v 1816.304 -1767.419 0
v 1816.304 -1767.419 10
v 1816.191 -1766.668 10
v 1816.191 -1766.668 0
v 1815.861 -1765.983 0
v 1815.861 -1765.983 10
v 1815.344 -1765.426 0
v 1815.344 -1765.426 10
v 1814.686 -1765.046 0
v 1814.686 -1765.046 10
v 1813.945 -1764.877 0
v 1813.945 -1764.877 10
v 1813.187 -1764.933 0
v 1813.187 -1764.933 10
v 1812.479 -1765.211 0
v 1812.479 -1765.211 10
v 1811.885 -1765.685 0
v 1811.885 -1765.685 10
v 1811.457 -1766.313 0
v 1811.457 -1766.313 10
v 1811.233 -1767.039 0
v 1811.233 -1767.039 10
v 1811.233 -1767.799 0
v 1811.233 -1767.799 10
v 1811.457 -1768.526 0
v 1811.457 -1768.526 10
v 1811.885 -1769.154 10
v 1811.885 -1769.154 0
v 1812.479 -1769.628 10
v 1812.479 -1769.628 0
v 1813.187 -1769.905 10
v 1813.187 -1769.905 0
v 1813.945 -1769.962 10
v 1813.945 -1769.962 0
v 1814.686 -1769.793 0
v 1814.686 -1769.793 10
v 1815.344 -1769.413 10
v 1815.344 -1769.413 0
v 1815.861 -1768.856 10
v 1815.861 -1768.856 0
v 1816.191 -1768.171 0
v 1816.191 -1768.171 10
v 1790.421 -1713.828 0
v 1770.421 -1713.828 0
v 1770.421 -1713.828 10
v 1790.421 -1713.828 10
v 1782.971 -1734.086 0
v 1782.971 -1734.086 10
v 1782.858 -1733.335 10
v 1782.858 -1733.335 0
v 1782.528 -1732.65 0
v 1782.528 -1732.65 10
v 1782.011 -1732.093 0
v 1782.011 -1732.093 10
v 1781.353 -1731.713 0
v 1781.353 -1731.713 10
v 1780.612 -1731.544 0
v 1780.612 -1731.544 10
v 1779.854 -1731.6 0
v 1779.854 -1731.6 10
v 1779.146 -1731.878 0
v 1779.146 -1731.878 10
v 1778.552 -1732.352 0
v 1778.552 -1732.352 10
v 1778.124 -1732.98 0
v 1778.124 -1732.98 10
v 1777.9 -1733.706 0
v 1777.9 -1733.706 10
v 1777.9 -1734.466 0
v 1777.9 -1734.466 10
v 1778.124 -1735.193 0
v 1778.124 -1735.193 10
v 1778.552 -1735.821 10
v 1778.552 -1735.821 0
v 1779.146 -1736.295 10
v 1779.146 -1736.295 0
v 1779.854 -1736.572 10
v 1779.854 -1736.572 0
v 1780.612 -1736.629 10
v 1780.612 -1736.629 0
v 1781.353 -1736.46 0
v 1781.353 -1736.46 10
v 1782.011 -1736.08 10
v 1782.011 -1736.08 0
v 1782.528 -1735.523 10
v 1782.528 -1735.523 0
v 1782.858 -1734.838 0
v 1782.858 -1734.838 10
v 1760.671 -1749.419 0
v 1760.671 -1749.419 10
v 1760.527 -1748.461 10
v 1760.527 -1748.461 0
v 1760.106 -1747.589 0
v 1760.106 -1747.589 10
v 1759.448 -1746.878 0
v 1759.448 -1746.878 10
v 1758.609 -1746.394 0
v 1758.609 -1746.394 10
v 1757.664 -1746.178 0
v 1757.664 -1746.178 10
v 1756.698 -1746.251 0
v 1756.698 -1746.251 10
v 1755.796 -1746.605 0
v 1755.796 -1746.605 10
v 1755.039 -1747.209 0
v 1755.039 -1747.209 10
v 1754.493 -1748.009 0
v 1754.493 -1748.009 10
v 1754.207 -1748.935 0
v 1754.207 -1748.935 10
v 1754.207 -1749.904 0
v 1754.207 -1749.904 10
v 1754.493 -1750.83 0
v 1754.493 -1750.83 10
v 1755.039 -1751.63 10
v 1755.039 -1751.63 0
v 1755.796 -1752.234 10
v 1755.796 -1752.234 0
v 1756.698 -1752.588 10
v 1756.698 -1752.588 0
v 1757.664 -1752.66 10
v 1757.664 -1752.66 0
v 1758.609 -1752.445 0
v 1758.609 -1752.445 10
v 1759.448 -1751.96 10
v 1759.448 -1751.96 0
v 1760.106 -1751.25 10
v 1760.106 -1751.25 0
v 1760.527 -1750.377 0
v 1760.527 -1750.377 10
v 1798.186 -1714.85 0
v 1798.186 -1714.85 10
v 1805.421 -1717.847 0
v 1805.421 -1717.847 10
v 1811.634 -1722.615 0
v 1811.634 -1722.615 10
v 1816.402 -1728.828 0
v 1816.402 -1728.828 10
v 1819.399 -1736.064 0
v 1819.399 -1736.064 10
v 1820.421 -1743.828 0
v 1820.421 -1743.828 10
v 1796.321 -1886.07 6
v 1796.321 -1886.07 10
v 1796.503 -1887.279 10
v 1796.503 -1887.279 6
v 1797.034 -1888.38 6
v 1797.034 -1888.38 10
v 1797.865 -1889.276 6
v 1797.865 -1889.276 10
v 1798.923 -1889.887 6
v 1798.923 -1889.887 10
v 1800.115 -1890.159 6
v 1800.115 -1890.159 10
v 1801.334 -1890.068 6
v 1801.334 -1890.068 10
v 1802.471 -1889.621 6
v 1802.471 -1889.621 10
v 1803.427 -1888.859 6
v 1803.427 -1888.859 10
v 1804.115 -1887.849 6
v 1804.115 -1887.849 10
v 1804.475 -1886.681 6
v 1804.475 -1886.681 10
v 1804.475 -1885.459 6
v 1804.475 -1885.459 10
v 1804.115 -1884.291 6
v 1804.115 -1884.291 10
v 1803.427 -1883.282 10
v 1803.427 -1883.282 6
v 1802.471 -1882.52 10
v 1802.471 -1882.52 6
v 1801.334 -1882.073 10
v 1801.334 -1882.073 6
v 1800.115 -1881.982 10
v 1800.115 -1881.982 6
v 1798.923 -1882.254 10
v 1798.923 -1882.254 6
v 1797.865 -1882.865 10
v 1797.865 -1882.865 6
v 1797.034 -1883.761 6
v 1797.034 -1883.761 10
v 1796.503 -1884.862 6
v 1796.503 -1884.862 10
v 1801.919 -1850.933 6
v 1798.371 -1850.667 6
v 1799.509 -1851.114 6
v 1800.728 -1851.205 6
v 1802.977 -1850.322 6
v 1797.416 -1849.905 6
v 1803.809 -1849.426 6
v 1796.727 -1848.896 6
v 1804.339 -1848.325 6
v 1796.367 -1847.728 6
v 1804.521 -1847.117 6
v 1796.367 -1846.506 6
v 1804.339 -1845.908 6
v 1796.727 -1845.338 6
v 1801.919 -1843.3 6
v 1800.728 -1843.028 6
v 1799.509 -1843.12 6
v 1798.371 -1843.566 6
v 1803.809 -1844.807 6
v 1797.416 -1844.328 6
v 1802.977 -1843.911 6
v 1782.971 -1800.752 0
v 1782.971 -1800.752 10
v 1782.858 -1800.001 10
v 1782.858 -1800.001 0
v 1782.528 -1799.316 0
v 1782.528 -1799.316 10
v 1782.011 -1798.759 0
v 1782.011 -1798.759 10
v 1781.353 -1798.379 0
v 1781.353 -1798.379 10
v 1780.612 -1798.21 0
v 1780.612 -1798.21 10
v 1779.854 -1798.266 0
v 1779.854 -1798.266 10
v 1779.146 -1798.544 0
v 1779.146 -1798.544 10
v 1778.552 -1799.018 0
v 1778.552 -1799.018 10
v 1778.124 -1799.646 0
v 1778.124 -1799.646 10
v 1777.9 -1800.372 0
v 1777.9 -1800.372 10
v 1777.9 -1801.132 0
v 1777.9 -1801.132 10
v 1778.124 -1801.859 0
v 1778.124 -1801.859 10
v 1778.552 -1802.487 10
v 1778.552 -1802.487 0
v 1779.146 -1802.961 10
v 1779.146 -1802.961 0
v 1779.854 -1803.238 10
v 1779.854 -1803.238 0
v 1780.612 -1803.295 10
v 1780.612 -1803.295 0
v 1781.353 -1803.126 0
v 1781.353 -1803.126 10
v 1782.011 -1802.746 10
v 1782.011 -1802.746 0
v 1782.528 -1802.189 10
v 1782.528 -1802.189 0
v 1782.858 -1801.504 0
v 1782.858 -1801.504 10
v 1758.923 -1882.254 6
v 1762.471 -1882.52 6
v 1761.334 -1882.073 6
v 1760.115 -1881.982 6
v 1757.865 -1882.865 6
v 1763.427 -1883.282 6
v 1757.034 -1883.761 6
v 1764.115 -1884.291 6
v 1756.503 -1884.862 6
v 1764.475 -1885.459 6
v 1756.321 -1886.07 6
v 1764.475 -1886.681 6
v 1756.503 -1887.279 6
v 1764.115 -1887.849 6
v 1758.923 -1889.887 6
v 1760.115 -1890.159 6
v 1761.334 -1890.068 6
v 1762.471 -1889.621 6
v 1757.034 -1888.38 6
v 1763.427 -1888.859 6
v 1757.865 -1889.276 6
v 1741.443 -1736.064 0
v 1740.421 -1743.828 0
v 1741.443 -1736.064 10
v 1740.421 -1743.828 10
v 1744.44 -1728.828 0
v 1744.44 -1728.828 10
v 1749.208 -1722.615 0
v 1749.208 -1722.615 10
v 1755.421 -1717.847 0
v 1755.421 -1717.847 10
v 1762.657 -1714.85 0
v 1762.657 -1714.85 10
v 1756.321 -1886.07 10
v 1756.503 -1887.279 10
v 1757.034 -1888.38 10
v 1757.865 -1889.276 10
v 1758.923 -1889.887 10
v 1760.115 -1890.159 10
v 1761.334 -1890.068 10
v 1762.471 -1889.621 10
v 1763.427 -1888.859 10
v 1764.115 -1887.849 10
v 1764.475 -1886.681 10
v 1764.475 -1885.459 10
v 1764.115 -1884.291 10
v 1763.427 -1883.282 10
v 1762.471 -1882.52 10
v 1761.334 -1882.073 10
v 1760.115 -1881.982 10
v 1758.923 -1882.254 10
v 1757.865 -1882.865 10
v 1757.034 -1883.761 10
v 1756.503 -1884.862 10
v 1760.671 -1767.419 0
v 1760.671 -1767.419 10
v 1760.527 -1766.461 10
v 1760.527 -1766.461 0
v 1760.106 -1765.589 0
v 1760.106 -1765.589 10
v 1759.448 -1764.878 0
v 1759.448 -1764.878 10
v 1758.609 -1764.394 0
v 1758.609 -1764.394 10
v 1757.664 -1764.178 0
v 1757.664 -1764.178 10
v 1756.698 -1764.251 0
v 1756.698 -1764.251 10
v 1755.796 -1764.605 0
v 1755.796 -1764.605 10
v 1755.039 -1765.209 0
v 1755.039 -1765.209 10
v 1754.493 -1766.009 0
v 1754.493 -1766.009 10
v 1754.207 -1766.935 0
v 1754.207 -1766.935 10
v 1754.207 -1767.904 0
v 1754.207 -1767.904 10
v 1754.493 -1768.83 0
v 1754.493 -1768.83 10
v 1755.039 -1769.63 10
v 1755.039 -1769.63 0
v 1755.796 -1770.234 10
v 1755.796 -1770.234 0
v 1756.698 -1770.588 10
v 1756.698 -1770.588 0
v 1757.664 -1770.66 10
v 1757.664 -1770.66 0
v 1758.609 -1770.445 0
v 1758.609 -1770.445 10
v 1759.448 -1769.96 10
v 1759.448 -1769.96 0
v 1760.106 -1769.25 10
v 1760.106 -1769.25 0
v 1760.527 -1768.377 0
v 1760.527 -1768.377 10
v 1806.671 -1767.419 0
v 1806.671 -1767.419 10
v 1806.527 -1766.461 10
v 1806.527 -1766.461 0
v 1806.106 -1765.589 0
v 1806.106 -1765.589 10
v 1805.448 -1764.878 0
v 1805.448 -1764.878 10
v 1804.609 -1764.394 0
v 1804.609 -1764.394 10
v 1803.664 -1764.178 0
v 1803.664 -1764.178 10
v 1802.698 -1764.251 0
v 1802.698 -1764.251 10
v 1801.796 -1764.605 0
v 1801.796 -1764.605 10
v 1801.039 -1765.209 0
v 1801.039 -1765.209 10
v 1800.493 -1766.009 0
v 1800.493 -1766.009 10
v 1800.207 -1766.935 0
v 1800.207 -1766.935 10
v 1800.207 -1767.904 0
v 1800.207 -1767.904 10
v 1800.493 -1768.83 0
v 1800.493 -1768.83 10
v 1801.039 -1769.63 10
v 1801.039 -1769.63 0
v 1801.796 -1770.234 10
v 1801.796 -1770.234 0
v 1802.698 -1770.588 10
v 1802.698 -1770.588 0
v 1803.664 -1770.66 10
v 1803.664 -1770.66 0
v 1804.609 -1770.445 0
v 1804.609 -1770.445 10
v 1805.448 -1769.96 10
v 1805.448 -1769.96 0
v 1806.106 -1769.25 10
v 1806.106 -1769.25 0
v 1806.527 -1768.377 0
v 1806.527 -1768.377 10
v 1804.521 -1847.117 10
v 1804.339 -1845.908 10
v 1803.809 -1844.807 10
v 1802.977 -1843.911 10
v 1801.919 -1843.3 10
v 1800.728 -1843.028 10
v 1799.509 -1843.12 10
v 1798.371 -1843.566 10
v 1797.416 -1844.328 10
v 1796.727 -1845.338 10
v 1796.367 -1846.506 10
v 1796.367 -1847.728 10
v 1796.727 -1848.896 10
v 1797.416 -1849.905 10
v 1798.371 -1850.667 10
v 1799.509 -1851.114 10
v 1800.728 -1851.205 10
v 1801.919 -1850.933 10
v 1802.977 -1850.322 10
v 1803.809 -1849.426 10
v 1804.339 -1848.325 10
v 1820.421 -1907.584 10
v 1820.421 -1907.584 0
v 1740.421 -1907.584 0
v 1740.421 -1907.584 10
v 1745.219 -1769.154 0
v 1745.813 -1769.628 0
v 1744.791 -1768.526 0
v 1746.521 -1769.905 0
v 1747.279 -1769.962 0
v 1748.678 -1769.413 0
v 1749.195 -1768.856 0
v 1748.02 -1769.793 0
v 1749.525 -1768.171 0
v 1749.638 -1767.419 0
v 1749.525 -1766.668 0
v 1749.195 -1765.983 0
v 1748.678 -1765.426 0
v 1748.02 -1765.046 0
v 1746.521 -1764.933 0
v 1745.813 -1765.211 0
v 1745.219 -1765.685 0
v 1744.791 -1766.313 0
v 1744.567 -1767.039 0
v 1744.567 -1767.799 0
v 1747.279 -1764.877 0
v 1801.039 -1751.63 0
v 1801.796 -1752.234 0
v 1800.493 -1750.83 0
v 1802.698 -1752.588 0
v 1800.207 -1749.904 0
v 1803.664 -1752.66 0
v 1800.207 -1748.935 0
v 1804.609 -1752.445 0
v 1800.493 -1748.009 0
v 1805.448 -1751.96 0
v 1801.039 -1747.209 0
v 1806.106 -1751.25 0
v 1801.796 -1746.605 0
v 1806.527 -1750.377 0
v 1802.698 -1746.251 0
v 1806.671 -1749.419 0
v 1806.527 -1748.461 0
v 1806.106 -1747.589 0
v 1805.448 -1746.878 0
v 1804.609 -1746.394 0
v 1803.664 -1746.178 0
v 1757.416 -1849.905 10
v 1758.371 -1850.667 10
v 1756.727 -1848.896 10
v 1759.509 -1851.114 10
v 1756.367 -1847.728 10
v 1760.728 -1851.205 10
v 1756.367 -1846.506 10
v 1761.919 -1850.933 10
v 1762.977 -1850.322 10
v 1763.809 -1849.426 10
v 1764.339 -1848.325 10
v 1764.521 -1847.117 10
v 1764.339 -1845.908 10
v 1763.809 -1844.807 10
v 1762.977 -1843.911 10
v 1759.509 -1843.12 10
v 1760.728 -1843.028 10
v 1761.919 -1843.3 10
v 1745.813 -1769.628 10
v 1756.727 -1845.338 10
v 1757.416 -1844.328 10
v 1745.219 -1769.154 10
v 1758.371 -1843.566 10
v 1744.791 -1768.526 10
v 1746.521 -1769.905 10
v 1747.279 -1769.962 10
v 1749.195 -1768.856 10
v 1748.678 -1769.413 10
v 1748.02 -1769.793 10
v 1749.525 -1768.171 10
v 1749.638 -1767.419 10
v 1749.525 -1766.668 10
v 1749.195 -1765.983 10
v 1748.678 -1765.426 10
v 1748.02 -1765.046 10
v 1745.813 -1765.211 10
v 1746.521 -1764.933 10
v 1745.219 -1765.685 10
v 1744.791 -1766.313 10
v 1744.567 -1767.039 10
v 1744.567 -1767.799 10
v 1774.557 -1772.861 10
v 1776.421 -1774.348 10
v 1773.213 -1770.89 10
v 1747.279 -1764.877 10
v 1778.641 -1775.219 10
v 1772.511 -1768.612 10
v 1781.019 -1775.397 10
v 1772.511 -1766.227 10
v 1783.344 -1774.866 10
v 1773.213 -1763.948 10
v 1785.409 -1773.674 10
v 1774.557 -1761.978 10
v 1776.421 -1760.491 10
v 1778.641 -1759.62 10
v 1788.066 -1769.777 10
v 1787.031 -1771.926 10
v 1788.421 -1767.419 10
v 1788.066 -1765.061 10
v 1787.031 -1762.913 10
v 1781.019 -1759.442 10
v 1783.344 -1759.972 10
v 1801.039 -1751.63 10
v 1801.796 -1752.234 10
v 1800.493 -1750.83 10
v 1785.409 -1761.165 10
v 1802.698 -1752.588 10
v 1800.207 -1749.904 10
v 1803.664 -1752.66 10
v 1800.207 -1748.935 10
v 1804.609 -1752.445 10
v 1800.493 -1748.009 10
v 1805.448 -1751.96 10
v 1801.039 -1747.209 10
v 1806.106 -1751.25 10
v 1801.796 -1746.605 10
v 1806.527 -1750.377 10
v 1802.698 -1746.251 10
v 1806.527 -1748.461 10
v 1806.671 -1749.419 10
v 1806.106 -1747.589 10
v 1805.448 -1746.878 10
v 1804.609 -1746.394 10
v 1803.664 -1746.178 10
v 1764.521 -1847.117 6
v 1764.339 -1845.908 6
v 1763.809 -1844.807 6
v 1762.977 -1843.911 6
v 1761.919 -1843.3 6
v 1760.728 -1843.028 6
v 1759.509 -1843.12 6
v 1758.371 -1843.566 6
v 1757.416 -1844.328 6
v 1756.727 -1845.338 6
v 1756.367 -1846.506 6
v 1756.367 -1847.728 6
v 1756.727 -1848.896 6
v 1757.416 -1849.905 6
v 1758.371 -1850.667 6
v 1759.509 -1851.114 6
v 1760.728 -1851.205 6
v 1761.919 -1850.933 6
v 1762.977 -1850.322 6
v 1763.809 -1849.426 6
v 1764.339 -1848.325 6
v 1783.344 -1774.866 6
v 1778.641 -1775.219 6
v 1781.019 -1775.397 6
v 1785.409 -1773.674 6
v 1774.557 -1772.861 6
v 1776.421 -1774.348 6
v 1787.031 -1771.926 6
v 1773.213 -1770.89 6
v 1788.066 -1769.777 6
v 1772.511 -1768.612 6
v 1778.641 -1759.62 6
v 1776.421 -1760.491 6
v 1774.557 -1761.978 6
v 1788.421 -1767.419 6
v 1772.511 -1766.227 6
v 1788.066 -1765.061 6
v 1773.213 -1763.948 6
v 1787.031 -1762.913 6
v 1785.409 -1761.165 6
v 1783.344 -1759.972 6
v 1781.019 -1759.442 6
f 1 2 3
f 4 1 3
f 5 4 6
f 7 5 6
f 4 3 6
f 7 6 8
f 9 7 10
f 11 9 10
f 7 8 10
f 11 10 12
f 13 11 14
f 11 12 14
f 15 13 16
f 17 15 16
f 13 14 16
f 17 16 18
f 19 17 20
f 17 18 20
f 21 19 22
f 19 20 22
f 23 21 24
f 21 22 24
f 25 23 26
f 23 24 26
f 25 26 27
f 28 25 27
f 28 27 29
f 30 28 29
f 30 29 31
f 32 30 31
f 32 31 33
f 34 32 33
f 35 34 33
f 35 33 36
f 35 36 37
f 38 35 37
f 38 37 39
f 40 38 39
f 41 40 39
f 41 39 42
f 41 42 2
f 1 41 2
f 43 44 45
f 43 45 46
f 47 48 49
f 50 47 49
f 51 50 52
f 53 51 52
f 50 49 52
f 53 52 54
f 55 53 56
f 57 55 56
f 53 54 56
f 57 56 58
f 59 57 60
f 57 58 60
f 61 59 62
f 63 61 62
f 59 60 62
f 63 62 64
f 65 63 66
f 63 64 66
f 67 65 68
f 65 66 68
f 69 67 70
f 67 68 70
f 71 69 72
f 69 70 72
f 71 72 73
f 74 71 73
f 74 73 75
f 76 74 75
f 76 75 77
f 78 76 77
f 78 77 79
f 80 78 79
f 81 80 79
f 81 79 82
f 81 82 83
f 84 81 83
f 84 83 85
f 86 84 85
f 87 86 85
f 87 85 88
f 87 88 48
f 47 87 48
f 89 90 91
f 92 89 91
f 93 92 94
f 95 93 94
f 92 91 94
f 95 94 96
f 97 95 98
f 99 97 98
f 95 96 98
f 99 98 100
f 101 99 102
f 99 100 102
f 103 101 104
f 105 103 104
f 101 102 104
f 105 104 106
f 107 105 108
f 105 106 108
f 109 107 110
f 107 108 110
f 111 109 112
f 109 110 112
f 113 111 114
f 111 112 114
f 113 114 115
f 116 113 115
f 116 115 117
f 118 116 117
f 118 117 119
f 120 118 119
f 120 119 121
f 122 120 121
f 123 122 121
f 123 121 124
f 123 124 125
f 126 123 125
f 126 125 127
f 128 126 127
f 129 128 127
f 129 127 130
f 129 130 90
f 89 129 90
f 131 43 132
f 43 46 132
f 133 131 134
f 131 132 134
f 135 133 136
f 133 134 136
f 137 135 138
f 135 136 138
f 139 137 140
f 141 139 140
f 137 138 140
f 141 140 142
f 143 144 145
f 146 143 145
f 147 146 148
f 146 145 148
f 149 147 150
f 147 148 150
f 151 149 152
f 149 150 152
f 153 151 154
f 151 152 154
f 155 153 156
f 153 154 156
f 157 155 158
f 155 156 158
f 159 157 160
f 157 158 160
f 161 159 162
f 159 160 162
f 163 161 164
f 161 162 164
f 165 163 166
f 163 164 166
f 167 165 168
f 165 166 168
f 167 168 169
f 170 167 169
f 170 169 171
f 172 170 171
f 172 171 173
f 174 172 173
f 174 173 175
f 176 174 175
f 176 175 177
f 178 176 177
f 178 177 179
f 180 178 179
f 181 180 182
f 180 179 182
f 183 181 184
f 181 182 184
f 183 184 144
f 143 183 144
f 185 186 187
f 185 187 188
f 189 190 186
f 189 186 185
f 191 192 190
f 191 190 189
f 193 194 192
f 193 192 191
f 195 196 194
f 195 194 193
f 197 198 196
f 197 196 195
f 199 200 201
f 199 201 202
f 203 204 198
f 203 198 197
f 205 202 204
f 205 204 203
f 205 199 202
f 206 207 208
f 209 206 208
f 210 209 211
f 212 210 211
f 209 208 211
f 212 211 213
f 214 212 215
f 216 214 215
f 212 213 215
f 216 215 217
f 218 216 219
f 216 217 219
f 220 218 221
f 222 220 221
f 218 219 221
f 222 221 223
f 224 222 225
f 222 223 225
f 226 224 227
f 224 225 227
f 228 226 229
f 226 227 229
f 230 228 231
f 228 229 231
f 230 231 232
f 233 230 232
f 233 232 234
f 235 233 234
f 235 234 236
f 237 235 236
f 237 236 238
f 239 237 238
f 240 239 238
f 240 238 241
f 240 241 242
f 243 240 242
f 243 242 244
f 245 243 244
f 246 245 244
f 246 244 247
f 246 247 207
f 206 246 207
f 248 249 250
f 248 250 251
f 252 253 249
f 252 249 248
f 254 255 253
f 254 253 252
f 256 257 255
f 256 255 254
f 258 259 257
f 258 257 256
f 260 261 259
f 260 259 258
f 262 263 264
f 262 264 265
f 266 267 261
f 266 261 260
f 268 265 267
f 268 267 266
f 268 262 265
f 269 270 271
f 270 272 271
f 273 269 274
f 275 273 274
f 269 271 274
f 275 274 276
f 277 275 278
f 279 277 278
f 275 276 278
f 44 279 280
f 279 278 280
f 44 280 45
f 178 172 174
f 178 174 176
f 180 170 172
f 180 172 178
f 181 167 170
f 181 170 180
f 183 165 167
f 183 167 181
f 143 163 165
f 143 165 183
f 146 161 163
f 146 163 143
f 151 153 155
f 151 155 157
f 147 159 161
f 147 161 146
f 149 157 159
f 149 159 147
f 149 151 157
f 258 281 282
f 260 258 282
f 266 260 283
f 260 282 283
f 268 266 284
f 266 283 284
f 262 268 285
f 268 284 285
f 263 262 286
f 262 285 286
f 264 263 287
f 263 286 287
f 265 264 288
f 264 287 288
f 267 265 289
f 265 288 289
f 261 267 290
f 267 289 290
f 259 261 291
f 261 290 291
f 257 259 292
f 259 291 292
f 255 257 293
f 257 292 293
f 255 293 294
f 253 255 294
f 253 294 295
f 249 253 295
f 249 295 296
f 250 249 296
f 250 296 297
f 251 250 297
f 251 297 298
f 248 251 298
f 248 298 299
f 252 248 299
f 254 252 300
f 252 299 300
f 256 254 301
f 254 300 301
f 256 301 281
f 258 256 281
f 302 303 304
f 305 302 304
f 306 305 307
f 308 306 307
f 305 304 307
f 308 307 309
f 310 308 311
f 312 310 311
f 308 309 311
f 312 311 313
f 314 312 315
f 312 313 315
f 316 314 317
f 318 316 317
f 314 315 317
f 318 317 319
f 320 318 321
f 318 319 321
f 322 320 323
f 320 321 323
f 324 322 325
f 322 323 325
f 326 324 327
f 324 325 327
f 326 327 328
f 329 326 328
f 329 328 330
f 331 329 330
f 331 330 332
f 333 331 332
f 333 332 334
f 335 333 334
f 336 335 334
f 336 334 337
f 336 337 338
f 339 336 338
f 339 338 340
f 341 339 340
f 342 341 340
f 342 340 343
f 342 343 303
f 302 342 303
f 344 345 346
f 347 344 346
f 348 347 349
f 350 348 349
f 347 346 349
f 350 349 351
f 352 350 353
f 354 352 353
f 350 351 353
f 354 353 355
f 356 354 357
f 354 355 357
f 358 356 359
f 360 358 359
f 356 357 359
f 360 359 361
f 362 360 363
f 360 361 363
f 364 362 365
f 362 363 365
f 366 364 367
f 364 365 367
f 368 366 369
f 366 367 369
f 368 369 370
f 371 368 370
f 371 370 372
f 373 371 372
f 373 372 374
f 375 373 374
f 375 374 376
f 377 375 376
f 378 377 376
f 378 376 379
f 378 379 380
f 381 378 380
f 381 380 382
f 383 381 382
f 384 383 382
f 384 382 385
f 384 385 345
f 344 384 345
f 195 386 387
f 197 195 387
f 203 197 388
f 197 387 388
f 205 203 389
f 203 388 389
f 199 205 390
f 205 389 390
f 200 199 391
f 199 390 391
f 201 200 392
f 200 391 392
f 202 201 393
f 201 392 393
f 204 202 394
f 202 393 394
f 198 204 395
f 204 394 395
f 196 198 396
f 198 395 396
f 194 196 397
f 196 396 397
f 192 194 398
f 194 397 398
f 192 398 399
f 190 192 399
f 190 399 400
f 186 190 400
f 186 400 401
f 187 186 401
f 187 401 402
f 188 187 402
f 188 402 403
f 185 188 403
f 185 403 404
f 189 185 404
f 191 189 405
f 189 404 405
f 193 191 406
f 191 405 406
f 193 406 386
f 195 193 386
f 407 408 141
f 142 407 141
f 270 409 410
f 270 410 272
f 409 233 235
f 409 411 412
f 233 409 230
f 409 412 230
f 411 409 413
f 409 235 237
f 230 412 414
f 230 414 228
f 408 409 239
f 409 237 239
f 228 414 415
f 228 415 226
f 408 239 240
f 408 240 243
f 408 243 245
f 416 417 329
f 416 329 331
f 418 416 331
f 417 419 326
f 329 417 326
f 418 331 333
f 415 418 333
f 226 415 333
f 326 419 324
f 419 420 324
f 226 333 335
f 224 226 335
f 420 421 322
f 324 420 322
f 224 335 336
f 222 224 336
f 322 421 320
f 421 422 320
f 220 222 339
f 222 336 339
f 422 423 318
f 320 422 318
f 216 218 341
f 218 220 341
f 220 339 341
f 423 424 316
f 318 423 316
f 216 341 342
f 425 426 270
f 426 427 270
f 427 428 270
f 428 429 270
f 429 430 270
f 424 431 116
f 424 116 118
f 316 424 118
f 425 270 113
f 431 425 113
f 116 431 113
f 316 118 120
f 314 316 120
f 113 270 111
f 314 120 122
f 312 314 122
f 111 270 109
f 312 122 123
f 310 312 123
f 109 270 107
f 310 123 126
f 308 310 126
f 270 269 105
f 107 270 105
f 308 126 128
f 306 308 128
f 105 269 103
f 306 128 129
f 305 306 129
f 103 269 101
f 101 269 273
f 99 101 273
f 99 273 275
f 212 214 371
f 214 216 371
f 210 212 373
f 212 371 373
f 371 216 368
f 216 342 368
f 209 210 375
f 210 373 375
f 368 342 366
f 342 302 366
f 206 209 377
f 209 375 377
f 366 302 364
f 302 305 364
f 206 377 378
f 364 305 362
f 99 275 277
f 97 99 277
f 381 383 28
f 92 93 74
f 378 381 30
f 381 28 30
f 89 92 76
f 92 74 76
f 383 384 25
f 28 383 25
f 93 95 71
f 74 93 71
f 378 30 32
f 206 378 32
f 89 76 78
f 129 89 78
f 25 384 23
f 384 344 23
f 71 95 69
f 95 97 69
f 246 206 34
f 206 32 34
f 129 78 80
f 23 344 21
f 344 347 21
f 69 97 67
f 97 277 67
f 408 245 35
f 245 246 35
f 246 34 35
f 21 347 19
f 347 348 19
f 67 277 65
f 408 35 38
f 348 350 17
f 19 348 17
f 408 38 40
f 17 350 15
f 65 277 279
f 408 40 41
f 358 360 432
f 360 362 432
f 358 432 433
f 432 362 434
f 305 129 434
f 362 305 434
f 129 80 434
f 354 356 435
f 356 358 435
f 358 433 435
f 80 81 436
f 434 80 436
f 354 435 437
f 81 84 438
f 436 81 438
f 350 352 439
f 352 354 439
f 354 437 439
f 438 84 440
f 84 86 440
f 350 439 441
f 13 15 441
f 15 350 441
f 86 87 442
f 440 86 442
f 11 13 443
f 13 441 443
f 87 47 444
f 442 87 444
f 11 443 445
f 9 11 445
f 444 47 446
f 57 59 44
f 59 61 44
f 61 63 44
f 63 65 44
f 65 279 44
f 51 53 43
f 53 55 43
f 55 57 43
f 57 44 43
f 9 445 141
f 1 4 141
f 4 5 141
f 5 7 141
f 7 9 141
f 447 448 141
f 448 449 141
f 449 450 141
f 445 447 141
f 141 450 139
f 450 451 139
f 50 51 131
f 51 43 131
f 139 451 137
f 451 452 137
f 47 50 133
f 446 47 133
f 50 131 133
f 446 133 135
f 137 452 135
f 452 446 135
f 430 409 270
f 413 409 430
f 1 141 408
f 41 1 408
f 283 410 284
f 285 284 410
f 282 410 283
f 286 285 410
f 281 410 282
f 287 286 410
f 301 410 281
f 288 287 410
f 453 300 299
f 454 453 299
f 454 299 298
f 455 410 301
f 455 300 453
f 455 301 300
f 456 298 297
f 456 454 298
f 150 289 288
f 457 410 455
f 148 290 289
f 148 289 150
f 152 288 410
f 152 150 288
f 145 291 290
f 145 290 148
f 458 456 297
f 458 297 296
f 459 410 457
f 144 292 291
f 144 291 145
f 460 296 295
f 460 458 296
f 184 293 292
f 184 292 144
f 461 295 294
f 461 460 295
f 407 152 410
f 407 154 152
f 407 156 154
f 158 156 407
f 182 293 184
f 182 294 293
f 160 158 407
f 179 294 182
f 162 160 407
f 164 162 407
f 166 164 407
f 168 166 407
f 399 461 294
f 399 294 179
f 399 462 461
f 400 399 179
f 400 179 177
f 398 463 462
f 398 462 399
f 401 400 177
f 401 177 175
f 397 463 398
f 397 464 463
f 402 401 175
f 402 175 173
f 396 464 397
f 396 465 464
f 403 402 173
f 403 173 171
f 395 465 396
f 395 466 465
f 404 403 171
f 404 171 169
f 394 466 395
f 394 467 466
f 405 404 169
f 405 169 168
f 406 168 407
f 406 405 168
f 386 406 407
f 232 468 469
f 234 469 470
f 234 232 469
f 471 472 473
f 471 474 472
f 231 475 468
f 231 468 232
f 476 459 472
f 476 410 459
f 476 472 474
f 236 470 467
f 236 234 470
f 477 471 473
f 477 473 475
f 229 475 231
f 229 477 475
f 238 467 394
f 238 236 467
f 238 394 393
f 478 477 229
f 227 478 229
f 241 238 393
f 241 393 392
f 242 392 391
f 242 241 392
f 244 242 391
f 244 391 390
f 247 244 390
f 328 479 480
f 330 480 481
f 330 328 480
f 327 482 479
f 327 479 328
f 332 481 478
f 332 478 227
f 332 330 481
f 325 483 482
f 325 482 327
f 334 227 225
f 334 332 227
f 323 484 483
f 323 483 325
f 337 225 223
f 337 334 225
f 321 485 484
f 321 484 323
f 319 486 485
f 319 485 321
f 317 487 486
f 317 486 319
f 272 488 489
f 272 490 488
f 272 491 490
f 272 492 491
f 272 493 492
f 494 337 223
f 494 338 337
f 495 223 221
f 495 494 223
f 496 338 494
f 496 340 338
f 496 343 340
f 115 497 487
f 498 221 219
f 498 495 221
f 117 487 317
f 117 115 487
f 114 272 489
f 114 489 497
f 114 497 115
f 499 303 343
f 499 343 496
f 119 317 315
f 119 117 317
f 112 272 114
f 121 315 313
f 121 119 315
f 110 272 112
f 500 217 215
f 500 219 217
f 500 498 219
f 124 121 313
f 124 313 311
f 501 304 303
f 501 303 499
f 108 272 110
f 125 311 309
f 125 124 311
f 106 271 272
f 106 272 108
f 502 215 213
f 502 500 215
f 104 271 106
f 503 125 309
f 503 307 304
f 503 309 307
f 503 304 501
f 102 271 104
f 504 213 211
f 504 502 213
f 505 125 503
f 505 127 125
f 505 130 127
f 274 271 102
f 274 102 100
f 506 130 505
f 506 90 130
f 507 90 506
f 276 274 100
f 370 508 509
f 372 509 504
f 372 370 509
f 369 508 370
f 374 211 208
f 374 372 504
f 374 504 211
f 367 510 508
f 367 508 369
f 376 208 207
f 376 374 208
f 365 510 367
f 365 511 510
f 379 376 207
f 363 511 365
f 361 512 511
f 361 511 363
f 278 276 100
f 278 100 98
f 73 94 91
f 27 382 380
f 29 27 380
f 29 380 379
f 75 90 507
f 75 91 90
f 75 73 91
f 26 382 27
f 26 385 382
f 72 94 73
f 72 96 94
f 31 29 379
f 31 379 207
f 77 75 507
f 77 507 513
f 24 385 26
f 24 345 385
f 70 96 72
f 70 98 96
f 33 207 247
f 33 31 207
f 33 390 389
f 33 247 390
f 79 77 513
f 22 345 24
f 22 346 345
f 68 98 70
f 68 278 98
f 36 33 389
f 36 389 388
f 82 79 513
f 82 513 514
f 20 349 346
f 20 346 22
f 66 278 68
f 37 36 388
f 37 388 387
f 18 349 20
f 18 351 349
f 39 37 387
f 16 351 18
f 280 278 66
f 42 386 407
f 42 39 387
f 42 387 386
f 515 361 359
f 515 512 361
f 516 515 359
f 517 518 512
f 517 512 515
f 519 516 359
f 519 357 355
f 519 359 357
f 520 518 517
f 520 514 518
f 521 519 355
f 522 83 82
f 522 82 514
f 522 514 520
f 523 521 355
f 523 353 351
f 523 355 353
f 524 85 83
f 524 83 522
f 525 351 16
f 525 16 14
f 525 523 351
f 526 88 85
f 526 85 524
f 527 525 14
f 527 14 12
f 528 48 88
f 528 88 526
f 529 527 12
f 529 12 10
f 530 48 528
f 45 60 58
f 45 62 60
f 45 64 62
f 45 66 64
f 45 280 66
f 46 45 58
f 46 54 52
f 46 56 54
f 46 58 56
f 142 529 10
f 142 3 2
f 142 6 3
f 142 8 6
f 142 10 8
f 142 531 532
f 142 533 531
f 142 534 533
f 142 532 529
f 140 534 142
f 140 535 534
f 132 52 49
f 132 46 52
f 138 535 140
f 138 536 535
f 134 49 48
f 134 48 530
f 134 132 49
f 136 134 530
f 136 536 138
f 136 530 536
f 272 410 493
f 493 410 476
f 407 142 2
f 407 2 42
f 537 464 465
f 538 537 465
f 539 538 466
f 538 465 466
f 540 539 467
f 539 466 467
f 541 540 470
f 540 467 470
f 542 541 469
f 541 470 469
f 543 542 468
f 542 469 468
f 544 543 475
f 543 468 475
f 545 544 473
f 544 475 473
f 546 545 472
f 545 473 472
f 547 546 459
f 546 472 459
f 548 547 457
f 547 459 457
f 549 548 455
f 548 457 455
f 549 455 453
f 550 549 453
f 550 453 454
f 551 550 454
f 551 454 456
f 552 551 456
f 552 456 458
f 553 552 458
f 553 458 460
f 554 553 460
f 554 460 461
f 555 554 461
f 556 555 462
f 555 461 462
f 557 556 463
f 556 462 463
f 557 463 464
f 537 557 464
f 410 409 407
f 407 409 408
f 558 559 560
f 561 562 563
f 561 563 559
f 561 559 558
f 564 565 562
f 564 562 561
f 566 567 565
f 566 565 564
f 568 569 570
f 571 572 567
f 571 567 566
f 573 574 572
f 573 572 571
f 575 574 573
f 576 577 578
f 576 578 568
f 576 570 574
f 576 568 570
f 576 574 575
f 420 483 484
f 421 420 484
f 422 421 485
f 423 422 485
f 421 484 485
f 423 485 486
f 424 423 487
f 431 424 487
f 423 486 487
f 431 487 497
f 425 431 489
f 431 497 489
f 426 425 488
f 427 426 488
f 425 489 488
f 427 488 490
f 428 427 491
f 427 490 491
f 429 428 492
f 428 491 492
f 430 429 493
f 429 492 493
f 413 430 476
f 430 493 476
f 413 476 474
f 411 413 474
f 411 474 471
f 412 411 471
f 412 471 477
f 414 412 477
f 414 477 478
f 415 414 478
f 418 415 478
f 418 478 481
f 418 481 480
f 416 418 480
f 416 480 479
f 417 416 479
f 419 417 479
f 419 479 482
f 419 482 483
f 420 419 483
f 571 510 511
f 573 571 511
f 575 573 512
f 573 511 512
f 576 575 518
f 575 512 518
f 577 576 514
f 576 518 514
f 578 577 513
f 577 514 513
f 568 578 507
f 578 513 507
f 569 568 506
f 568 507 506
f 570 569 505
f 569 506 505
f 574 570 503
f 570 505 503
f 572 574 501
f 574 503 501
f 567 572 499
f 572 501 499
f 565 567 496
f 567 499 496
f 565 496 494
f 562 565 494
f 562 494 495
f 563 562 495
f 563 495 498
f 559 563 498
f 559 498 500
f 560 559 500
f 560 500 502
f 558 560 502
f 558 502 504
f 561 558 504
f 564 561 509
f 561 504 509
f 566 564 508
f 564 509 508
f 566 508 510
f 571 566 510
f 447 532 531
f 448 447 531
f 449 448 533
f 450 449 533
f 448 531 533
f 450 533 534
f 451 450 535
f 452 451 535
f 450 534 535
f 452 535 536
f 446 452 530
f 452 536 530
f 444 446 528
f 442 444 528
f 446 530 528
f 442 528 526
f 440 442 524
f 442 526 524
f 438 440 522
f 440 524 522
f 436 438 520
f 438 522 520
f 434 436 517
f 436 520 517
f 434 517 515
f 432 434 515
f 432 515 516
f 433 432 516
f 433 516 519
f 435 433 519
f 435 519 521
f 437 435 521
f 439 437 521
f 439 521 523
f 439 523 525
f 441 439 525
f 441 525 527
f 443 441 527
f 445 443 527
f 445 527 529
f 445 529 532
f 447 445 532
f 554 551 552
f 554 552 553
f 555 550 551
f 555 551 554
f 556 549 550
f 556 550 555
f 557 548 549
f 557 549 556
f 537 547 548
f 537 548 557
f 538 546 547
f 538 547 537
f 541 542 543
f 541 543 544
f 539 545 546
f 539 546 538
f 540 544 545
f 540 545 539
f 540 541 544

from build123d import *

# Parameters (mm, degrees)
SKETCH1_W                = 80
SKETCH1_H                = 193.756044748
BOSS_EXTRUDE1_DEPTH      = 10
SCHIZZO2_R               = 2.549999997
SCHIZZO2_R_2             = 2.55
TAGLIO_ESTRUSIONE4_DEPTH = 2637.837278588
SCHIZZO3_R               = 3.25
TAGLIO_ESTRUSIONE5_DEPTH = 2637.837278588
SCHIZZO6_R               = 4.1
TAGLIO_ESTRUSIONE6_DEPTH = 4
RACCORDO1_R              = 30
SCHIZZO7_R               = 8
TAGLIO_ESTRUSIONE7_DEPTH = 4


with BuildPart() as part:
    # Sketch1 → Boss-Extrude1 (new body)
    with BuildSketch(Plane.XY):
        with Locations((1780.42117355, -1810.70620503)):
            Rectangle(SKETCH1_W, SKETCH1_H)
    extrude(amount=BOSS_EXTRUDE1_DEPTH)

    # Schizzo2 → Taglio-Estrusione4 (cut, through all)
    with BuildSketch(Plane.XY.offset(10)):
        with Locations((1747.088159885, -1767.419409113)):
            Circle(SCHIZZO2_R)
        with Locations((1780.42117355, -1734.086395448)):
            Circle(SCHIZZO2_R_2)
        with Locations((1813.754187215, -1767.419409113)):
            Circle(SCHIZZO2_R_2)
        with Locations((1780.42117355, -1800.752422779)):
            Circle(SCHIZZO2_R_2)
    extrude(amount=-TAGLIO_ESTRUSIONE4_DEPTH, mode=Mode.SUBTRACT)

    # Schizzo3 → Taglio-Estrusione5 (cut, through all)
    with BuildSketch(Plane.XY.offset(10)):
        with Locations((1803.421173548, -1749.419409113)):
            Circle(SCHIZZO3_R)
        with Locations((1803.421173548, -1767.419409113)):
            Circle(SCHIZZO3_R)
        with Locations((1757.421173548, -1749.419409113)):
            Circle(SCHIZZO3_R)
        with Locations((1757.421173548, -1767.419409113)):
            Circle(SCHIZZO3_R)
    extrude(amount=-TAGLIO_ESTRUSIONE5_DEPTH, mode=Mode.SUBTRACT)

    # Schizzo6 → Taglio-Estrusione6 (cut)
    with BuildSketch(Plane.XY.offset(10)):
        with Locations((1760.42117355, -1847.116784923)):
            Circle(SCHIZZO6_R)
        with Locations((1800.42117355, -1847.116784923)):
            Circle(SCHIZZO6_R)
        with Locations(Location((1800.42117355, -1886.070299533, 0), (0, 0, 180))):
            Circle(SCHIZZO6_R)
        with Locations(Location((1760.42117355, -1886.070299533, 0), (0, 0, 180))):
            Circle(SCHIZZO6_R)
    extrude(amount=-TAGLIO_ESTRUSIONE6_DEPTH, mode=Mode.SUBTRACT)

    # Raccordo1
    raccordo1_edges = [part.edges().sort_by_distance(p)[0] for p in [
        (1740.42117355, -1713.828182656, 5),
        (1820.42117355, -1713.828182656, 5),
    ]]
    fillet(raccordo1_edges, radius=RACCORDO1_R)

    # Schizzo7 → Taglio-Estrusione7 (cut)
    with BuildSketch(Plane.XY.offset(10)):
        with Locations((1780.42117355, -1767.419409113)):
            Circle(SCHIZZO7_R)
    extrude(amount=-TAGLIO_ESTRUSIONE7_DEPTH, mode=Mode.SUBTRACT)


solid = part.part
